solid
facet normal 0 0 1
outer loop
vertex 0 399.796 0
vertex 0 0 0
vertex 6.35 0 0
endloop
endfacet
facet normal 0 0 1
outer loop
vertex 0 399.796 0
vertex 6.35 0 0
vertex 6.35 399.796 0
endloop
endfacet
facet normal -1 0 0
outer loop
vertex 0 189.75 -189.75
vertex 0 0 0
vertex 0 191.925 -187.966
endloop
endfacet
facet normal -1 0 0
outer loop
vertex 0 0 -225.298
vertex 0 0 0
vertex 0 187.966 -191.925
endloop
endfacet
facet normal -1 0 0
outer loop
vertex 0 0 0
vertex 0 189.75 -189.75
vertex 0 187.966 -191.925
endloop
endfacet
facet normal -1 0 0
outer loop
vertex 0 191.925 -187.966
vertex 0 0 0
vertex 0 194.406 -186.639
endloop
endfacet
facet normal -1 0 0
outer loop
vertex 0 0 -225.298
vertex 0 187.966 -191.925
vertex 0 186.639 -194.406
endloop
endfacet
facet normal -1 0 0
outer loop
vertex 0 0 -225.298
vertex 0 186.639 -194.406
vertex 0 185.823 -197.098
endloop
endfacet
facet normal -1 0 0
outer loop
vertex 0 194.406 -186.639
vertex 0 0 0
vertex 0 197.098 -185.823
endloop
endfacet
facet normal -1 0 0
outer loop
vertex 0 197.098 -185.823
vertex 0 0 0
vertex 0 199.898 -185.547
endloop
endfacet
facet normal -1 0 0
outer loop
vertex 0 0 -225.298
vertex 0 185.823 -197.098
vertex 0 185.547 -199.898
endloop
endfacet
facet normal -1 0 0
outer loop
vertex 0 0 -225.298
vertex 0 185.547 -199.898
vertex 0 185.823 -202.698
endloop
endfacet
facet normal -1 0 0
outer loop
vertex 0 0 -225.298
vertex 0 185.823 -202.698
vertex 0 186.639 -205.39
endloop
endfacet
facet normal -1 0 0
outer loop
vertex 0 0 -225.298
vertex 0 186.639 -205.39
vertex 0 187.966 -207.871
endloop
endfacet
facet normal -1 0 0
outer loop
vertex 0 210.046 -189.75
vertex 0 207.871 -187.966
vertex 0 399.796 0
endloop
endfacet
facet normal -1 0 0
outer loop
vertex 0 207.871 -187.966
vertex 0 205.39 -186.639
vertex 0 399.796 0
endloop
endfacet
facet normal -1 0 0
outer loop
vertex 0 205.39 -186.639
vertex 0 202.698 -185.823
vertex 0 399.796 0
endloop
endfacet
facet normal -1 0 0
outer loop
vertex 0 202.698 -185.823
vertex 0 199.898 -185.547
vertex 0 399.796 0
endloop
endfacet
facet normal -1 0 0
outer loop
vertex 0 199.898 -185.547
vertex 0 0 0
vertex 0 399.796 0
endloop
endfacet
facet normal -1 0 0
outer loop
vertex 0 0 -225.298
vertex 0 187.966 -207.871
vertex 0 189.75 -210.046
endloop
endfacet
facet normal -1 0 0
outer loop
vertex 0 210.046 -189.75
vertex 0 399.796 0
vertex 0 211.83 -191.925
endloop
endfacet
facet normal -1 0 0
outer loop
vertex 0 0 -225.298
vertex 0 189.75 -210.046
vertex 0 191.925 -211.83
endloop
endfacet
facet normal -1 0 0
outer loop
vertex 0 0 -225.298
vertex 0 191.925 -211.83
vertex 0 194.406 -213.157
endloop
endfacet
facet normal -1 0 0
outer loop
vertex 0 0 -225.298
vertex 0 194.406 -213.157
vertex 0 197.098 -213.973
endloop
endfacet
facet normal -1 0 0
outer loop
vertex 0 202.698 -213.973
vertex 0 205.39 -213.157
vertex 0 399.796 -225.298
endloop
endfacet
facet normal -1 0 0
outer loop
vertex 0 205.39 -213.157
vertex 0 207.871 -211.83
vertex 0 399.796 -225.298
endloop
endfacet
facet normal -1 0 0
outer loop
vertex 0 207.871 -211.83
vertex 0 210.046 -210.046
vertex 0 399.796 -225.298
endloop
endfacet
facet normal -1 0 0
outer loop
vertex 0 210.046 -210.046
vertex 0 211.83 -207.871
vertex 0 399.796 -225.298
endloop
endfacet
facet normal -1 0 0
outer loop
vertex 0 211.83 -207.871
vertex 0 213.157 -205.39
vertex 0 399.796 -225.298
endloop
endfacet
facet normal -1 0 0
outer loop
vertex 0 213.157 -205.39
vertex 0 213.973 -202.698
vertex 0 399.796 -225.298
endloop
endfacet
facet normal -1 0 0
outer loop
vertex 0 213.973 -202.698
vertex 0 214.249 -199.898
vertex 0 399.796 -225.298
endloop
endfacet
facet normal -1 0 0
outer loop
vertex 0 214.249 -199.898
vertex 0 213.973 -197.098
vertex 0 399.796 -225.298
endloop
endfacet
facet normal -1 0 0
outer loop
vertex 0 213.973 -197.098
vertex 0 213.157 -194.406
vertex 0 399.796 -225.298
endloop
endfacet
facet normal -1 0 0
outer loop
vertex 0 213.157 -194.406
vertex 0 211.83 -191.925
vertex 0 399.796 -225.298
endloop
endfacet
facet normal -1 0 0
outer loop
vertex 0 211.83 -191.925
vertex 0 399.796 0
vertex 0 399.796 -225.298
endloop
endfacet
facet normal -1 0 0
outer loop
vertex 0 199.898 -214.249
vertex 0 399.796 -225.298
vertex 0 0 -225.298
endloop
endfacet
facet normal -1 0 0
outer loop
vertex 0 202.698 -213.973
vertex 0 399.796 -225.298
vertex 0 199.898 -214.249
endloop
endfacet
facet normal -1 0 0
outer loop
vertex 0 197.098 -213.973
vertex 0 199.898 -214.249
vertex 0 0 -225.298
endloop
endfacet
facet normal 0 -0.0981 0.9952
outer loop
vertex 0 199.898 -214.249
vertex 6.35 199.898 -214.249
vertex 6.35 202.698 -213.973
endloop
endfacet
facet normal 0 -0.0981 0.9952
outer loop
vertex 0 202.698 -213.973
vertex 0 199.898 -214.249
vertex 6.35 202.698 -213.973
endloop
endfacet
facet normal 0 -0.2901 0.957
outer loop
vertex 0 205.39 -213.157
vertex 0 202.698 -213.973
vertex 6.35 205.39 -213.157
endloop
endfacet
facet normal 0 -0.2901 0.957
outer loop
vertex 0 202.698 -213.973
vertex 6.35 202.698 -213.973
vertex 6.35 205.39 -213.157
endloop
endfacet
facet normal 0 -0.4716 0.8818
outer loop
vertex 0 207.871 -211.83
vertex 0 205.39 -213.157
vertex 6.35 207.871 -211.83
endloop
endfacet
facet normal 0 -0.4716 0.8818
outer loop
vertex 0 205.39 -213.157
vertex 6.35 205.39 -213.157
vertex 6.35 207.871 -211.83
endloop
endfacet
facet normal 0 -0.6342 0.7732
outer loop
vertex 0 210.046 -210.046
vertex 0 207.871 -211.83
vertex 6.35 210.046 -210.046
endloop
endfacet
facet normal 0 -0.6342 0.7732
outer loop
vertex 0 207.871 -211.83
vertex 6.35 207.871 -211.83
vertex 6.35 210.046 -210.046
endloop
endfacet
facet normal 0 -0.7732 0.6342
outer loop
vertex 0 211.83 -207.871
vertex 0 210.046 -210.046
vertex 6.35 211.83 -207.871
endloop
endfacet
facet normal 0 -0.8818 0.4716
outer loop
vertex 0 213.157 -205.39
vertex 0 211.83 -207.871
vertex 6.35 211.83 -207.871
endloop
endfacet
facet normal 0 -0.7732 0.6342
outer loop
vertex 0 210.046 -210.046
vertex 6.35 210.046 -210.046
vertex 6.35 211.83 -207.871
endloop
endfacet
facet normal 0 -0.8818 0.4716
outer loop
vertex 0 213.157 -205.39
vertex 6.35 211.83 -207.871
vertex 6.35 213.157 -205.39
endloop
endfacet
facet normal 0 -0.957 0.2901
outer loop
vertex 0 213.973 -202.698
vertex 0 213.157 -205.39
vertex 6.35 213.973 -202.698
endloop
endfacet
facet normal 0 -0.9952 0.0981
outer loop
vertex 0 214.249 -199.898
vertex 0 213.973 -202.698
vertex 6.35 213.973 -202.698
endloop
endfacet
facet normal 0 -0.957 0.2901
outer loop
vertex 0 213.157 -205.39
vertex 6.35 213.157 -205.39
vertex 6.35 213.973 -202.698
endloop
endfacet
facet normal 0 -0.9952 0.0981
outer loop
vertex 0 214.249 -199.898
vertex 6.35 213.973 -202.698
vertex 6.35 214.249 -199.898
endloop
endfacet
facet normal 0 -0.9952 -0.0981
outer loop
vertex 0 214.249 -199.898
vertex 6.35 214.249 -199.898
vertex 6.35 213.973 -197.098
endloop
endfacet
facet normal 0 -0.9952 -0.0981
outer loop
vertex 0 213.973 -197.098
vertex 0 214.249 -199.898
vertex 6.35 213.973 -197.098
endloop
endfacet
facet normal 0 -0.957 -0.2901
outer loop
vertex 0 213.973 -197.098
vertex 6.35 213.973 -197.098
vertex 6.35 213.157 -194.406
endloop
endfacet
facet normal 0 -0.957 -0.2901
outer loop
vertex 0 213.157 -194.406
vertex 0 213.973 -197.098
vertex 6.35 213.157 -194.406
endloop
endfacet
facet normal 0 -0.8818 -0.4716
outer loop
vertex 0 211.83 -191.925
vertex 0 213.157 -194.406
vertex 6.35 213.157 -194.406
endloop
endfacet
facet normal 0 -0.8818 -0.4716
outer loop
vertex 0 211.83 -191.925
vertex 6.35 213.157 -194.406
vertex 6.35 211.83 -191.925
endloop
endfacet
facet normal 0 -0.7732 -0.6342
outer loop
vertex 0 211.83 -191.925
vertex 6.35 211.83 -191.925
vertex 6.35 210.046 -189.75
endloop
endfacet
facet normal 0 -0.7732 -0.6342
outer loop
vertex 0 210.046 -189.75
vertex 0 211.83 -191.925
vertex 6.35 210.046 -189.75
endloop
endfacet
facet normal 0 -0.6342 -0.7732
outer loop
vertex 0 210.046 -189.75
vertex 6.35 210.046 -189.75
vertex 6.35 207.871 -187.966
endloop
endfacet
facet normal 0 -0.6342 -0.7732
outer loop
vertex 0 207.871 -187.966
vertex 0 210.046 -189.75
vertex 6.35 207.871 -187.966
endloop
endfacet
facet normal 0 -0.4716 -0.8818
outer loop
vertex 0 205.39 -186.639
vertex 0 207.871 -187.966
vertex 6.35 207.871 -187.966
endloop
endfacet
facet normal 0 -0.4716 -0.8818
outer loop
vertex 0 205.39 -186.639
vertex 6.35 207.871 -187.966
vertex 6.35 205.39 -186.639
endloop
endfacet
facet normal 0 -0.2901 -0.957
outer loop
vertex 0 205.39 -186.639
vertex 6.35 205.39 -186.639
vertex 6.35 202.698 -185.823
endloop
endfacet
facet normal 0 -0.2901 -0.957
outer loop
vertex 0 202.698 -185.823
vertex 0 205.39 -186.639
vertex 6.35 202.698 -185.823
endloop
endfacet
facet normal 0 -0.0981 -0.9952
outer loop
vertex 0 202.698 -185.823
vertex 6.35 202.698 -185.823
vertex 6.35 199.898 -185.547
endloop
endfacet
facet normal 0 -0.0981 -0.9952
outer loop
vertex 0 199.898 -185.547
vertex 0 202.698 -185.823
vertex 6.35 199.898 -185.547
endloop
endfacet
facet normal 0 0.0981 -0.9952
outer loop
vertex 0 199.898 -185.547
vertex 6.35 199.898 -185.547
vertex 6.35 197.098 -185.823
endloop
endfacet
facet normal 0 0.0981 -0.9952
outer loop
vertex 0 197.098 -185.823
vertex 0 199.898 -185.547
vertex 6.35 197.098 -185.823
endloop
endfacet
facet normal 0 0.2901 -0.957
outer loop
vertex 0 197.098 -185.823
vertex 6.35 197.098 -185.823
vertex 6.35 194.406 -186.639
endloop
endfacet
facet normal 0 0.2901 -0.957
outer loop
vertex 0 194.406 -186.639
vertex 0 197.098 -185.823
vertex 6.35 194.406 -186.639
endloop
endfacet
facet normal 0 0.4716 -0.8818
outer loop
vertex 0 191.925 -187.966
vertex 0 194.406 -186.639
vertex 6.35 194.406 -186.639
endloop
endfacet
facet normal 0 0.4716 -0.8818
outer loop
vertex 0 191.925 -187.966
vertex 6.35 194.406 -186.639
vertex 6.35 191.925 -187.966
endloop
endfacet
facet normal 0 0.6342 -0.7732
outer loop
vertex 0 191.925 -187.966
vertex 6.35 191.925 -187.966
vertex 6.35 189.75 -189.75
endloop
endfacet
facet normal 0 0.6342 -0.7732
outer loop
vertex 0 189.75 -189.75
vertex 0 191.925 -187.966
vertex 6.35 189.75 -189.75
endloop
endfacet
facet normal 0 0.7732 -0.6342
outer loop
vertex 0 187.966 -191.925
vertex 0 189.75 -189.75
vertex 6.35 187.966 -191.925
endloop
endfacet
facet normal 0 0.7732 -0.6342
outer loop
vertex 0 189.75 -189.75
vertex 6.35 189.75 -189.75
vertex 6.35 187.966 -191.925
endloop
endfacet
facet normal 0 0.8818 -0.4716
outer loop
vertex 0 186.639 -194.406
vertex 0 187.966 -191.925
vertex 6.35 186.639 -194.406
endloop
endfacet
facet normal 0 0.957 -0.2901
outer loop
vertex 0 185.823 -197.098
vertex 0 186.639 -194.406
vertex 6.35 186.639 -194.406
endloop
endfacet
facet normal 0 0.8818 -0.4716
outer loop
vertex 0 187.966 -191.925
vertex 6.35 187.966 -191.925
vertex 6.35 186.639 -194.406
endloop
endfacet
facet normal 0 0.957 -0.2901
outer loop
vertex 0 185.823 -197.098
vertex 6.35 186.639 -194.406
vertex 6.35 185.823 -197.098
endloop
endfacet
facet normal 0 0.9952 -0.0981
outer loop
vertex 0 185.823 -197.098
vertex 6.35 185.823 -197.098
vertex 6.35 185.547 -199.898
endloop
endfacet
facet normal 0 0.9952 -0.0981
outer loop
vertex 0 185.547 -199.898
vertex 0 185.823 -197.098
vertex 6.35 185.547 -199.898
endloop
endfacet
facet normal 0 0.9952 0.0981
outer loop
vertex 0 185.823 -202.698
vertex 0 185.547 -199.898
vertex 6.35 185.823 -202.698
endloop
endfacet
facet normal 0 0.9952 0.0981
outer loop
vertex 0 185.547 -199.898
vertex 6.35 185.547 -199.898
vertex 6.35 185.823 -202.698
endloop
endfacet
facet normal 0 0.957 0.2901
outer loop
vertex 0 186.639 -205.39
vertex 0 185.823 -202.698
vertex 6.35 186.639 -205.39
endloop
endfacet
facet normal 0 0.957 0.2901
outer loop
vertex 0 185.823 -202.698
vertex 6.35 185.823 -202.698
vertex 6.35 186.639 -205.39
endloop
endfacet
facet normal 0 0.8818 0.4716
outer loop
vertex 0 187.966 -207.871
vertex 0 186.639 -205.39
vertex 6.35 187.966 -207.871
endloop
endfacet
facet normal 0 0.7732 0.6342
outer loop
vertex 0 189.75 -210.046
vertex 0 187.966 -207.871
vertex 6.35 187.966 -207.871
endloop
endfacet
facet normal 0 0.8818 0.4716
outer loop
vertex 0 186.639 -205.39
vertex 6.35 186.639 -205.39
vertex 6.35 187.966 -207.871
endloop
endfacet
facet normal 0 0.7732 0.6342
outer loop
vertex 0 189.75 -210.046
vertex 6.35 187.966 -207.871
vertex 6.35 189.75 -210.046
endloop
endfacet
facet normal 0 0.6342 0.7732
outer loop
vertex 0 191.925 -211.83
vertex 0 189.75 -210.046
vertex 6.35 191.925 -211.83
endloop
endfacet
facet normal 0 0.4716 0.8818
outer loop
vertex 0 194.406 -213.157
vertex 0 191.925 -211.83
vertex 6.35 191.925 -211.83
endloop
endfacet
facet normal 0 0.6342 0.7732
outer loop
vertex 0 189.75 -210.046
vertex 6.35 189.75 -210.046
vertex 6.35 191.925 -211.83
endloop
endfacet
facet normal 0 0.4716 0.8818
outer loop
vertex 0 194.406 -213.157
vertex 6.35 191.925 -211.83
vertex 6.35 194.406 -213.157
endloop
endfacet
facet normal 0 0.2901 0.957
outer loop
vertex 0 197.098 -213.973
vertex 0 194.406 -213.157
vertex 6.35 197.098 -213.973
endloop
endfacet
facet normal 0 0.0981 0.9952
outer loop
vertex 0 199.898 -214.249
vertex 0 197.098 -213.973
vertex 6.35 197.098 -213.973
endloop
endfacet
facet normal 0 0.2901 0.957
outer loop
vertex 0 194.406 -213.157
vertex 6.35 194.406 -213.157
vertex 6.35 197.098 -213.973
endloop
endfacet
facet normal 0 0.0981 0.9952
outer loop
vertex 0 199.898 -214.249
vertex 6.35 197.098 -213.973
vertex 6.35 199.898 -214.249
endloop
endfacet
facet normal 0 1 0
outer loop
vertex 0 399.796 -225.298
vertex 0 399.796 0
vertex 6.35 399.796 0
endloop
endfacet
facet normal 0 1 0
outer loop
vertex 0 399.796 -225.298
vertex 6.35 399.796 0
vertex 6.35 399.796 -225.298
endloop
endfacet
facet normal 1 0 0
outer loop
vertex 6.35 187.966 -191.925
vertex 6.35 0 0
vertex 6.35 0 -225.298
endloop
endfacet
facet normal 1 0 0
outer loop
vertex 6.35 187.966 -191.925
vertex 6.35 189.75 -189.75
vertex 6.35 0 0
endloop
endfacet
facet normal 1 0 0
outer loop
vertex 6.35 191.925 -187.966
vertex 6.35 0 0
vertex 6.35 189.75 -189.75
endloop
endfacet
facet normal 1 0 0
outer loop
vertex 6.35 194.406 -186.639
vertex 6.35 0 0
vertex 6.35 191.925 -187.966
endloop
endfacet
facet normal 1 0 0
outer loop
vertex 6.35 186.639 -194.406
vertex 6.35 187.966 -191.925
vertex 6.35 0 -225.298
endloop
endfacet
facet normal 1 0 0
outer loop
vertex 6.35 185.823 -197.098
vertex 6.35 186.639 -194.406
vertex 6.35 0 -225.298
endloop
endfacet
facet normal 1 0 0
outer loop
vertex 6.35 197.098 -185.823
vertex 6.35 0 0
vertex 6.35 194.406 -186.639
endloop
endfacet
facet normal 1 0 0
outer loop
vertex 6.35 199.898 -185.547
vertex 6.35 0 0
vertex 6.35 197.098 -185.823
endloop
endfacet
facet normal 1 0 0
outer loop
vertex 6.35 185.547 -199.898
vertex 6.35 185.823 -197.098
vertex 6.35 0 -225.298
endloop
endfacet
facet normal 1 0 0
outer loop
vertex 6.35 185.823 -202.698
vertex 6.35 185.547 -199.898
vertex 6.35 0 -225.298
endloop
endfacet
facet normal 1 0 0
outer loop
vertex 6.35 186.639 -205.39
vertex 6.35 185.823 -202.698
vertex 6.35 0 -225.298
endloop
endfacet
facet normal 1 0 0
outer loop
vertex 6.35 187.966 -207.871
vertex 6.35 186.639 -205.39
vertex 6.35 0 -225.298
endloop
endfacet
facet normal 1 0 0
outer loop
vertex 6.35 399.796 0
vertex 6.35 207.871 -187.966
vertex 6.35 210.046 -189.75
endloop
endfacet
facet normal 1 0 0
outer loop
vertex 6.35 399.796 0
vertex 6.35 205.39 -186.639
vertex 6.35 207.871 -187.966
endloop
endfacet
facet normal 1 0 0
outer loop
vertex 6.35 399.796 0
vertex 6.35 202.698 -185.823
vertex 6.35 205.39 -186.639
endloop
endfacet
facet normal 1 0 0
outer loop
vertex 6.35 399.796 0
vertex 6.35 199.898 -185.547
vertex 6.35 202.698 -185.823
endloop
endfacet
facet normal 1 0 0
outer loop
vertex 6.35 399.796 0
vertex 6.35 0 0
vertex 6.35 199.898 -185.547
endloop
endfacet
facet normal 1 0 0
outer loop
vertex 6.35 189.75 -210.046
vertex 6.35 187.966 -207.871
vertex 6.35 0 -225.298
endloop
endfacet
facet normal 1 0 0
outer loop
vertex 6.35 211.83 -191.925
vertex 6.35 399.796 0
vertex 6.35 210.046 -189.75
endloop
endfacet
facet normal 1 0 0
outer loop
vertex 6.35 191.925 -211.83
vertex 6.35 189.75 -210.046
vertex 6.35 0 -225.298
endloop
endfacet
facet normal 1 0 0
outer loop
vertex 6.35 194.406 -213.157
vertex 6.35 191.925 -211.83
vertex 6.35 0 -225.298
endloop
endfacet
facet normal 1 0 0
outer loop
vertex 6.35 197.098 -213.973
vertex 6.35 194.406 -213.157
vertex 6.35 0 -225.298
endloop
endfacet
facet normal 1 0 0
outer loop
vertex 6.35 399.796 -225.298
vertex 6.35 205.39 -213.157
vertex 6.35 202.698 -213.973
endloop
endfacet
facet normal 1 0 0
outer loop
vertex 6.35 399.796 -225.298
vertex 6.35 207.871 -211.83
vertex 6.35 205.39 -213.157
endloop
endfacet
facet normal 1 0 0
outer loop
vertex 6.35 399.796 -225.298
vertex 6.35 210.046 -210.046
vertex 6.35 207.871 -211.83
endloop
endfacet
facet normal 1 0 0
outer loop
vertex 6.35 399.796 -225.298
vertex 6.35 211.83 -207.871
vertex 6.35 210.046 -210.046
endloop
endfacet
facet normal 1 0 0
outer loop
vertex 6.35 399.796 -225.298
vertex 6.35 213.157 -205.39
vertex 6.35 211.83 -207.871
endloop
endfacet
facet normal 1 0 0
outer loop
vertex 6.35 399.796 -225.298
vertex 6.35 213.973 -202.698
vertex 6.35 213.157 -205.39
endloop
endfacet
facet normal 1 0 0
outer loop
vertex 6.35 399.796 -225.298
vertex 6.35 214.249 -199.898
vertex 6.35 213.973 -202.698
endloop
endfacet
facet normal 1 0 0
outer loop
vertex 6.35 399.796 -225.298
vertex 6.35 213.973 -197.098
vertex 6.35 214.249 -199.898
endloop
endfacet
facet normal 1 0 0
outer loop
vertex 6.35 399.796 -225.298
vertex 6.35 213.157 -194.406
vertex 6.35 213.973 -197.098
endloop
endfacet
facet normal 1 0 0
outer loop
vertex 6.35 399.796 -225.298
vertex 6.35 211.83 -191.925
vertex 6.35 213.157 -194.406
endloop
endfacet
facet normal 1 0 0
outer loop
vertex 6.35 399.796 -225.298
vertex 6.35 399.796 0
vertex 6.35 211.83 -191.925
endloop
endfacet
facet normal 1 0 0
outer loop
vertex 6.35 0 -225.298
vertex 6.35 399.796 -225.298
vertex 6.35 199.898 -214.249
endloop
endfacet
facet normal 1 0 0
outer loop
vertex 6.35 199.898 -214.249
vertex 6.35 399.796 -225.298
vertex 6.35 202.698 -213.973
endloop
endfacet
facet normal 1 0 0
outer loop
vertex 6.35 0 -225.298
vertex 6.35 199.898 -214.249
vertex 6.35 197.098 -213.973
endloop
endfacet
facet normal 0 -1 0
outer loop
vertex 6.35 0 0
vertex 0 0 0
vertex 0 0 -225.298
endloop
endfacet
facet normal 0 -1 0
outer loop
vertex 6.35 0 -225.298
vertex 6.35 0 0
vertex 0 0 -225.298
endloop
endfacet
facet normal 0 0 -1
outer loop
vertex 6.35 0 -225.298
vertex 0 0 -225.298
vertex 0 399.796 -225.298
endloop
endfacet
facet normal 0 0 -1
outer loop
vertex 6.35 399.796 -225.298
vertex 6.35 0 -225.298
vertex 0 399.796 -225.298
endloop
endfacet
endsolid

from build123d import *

# Parameters (mm, degrees)
SKETCH1_W               = 225.298
SKETCH1_H               = 399.796
BOSS_EXTRUDE1_DEPTH     = 6.35
SKETCH2_R               = 14.351
CUT_EXTRUDE1_DEPTH      = 1
CUT_EXTRUDE1_DEPTH_BACK = 7.35


with BuildPart() as part:
    # Sketch1 → Boss-Extrude1 (new body)
    with BuildSketch(Plane(origin=(0, 0, 0), x_dir=(0, 0, -1), z_dir=(1, 0, 0))):
        with Locations((112.649, 199.898)):
            Rectangle(SKETCH1_W, SKETCH1_H)
    extrude(amount=BOSS_EXTRUDE1_DEPTH)

    # Sketch2 → Cut-Extrude1 (cut, two sides)
    with BuildSketch(Plane(origin=(6.35, 0, 0), x_dir=(0, 0, -1), z_dir=(1, 0, 0))) as cut_extrude1_sk:
        with Locations((199.898, 199.898)):
            Circle(SKETCH2_R)
    extrude(amount=CUT_EXTRUDE1_DEPTH, mode=Mode.SUBTRACT)
    extrude(cut_extrude1_sk.sketch, amount=-CUT_EXTRUDE1_DEPTH_BACK, mode=Mode.SUBTRACT)


solid = part.part
